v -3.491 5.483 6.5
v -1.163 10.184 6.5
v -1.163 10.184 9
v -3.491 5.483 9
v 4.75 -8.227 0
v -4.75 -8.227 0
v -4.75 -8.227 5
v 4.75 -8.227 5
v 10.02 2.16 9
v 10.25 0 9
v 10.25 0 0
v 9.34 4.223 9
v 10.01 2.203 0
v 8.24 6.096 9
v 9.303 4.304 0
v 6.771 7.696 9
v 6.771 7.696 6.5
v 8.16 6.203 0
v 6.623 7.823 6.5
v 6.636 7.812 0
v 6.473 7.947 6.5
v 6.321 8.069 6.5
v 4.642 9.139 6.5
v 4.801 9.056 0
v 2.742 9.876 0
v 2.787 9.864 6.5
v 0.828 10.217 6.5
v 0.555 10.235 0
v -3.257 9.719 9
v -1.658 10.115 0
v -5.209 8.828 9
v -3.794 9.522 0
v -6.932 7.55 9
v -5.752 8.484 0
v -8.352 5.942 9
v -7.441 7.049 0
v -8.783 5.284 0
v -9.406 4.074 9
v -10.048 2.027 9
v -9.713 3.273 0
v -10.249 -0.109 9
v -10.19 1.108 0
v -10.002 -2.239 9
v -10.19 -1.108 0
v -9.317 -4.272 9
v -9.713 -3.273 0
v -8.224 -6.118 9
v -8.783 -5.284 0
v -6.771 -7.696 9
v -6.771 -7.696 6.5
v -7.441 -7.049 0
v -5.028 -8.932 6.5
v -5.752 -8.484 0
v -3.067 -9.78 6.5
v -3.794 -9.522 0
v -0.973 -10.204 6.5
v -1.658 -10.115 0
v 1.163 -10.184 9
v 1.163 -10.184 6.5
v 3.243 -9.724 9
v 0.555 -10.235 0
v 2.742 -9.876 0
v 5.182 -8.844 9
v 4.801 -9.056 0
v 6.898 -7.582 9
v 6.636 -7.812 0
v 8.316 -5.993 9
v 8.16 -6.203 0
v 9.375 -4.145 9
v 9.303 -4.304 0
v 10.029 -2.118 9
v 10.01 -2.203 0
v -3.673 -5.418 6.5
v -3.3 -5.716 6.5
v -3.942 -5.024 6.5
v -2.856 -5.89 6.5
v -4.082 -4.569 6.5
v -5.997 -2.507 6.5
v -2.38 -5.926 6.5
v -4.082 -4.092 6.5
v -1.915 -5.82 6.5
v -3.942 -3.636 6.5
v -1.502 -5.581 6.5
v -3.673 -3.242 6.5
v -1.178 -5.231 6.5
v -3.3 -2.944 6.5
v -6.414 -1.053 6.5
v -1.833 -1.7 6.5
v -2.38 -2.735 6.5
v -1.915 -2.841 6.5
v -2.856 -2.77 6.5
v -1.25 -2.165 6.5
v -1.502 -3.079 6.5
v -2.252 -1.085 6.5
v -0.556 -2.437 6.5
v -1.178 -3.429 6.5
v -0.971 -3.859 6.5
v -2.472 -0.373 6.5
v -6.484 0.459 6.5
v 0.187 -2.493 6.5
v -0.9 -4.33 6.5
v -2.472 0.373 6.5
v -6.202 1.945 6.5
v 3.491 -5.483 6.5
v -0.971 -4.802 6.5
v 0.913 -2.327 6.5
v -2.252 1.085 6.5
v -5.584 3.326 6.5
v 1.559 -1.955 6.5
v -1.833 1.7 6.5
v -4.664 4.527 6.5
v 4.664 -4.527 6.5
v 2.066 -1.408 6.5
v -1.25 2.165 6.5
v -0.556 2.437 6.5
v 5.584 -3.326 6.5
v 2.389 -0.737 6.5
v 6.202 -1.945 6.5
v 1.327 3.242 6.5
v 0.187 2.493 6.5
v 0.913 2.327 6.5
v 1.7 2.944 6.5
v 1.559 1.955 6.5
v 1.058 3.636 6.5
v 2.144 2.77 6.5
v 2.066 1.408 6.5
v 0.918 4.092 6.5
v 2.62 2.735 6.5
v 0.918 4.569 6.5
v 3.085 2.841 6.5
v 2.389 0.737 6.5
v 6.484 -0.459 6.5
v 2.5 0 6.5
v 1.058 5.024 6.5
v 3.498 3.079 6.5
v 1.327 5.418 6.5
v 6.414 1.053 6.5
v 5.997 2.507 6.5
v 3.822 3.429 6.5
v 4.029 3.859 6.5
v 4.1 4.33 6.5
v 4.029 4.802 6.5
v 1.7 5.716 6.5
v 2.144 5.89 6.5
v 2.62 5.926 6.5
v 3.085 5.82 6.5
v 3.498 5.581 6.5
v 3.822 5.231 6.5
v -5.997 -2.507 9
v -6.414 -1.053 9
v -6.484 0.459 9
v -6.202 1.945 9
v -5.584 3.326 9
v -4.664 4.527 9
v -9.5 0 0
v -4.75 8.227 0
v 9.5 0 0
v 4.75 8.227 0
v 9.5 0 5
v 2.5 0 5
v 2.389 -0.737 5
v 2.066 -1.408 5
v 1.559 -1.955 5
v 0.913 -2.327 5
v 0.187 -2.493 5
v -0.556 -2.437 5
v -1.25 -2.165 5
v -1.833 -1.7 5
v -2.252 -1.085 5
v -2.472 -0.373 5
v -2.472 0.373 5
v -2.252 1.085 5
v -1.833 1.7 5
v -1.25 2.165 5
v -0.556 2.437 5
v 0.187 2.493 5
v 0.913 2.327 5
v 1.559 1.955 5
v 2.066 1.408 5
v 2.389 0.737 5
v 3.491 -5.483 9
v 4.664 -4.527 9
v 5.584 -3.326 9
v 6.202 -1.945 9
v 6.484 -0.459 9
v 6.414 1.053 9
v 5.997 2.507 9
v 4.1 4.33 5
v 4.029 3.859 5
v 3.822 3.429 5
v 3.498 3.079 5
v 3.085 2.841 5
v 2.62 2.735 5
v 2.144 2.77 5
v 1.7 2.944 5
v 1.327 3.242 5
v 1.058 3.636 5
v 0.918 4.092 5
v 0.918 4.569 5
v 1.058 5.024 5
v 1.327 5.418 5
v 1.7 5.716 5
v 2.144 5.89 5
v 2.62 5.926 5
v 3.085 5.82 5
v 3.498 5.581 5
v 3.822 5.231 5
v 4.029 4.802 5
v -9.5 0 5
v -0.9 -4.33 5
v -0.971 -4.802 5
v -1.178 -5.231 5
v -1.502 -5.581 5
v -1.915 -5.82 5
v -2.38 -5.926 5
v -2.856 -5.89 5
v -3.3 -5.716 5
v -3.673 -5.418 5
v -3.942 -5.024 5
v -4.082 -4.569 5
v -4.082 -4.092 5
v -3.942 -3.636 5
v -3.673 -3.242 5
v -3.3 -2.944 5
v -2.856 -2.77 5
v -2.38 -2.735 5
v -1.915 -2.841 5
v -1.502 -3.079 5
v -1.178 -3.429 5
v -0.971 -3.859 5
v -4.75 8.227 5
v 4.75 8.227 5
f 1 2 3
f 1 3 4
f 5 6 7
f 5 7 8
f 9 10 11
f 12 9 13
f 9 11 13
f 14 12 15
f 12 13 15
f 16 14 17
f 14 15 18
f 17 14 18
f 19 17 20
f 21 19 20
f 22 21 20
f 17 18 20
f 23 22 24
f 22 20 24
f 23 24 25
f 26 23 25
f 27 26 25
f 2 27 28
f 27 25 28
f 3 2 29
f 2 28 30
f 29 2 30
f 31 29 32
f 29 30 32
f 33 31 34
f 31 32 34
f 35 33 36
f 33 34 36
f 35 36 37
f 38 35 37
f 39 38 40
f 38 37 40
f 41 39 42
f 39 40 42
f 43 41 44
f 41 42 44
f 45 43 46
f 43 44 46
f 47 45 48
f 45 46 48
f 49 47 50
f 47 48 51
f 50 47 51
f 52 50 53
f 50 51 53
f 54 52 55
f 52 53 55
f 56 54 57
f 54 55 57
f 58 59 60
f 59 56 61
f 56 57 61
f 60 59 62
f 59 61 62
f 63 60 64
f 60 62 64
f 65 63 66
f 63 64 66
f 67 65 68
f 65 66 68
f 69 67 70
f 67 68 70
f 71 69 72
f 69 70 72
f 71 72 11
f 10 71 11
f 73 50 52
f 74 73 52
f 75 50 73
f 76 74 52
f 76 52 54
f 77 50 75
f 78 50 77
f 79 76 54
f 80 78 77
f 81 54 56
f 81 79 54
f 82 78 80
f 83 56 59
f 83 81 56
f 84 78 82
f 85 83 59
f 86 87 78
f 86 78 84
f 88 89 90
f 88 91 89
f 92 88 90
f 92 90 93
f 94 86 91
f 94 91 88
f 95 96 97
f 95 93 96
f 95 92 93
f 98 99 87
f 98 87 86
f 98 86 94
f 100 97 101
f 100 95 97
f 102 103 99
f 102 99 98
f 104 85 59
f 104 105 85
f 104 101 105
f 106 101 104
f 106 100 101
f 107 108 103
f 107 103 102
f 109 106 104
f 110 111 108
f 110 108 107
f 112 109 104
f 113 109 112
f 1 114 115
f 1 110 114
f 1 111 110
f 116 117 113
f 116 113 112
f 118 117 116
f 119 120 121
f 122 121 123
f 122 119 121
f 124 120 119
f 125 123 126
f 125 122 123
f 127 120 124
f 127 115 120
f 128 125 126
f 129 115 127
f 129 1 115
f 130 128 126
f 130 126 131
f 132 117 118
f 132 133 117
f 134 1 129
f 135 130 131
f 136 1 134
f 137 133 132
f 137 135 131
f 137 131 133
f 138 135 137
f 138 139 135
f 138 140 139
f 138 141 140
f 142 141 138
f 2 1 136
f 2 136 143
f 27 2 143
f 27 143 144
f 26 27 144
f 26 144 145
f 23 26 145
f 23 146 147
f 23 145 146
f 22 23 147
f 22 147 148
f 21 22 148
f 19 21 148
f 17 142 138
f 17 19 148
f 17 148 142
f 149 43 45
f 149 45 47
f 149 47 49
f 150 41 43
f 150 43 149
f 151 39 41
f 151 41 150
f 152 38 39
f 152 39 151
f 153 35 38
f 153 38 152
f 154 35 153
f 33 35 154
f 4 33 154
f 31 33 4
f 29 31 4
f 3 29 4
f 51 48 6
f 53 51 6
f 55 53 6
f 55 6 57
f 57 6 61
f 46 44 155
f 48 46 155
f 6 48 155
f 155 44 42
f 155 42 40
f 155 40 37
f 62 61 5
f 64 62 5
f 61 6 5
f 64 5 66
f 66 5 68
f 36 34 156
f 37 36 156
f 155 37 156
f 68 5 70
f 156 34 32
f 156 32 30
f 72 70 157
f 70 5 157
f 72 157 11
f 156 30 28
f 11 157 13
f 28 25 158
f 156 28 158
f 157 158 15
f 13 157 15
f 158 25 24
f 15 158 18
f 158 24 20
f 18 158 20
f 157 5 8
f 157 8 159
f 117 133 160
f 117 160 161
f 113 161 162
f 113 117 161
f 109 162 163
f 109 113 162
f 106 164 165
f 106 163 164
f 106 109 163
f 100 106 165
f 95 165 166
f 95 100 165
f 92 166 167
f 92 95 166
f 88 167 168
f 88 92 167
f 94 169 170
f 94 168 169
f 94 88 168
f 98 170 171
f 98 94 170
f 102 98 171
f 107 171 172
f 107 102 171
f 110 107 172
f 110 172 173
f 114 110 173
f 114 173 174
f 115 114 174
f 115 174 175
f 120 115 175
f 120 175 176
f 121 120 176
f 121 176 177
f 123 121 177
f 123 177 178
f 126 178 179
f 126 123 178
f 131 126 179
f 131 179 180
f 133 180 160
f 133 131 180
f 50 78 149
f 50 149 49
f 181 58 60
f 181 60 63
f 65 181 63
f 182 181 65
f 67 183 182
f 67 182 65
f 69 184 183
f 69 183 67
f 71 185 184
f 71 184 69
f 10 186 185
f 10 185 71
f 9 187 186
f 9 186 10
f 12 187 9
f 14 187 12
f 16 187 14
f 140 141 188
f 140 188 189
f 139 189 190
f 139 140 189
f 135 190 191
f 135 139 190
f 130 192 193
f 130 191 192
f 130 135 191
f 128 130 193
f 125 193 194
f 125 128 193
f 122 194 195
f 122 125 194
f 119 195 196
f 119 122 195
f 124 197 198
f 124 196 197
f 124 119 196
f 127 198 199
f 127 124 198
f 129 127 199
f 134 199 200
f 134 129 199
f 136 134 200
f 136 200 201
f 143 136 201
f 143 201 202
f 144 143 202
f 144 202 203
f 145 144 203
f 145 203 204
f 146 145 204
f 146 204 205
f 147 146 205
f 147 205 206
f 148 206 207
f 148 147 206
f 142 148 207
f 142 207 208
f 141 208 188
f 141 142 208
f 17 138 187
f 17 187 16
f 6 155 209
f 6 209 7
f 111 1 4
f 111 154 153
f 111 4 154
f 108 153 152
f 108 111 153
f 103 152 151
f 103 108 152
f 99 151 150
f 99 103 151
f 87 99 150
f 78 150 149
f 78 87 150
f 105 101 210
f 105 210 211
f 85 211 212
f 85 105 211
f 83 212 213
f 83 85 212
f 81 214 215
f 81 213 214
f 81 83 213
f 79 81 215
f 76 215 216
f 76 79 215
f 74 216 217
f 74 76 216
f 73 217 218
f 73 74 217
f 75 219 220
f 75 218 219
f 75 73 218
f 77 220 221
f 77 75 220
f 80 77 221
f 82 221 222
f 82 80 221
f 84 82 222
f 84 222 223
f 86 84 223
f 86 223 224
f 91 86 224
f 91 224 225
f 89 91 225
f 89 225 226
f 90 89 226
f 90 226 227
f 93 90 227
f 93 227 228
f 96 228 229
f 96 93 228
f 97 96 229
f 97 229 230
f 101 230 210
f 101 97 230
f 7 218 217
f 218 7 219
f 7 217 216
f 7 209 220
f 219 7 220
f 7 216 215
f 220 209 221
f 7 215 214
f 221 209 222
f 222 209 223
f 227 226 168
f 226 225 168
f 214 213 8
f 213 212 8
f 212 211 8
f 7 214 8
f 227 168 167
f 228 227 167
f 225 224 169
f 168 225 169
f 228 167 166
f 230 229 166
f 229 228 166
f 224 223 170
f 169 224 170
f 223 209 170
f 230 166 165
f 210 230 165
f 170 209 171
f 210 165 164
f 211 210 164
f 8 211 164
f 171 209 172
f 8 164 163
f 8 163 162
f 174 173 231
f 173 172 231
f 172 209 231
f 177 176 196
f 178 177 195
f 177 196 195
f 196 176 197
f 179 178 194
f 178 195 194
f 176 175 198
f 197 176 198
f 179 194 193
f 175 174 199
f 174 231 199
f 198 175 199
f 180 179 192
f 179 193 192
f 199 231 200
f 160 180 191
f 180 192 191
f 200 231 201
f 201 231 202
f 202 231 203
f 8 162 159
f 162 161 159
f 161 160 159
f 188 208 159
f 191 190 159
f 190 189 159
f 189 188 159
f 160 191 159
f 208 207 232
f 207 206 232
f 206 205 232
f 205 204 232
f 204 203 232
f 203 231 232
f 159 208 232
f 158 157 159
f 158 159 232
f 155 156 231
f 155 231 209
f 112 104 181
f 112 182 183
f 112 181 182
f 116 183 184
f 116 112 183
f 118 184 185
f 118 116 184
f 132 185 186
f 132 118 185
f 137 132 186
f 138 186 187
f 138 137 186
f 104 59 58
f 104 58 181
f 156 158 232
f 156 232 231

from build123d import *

# Parameters (mm, degrees)
SKETCH1_R               = 10.25
BOSS_EXTRUDE1_DEPTH     = 5
SKETCH2_R               = 10.25
BOSS_EXTRUDE2_DEPTH     = 4
CUT_EXTRUDE1_DEPTH      = 18.062385531
CUT_EXTRUDE1_DEPTH_BACK = 2.5
CUT_EXTRUDE2_DEPTH      = 16.333786225
CUT_EXTRUDE2_DEPTH_BACK = 16.333786225
SKETCH4_R               = 1.6
CUT_EXTRUDE3_DEPTH      = 16.333786225
CUT_EXTRUDE3_DEPTH_BACK = 16.333786225
SKETCH5_R               = 2.5


with BuildPart() as part:
    # Sketch1 → Boss-Extrude1 (new body)
    with BuildSketch(Plane.XY):
        Circle(SKETCH1_R)
        Polygon((4.75, 8.227241336), (-4.75, 8.227241336), (-9.5, 0), (-4.75, -8.227241336), (4.75, -8.227241336), (9.5, 0), align=None, mode=Mode.SUBTRACT)
    extrude(amount=BOSS_EXTRUDE1_DEPTH)

    # Sketch2 → Boss-Extrude2 (add)
    with BuildSketch(Plane.XY.offset(5)):
        Circle(SKETCH2_R)
    extrude(amount=BOSS_EXTRUDE2_DEPTH)

    # Sketch3 → Cut-Extrude1 (cut, two sides: drawn at the far end of the back side and taken through both)
    with BuildSketch(Plane.XY.offset(9).offset(-CUT_EXTRUDE1_DEPTH_BACK)):
        with BuildLine():
            ThreePointArc((-3.491027293, 5.482948882), (-6.202138006, 1.94511803), (-5.996942005, -2.507326583))
            Line((-5.996942005, -2.507326583), (-6.770608941, -7.695541213))
            ThreePointArc((-6.770608941, -7.695541213), (-3.067301509, -9.780294548), (1.163287858, -10.183774416))
            Line((1.163287858, -10.183774416), (3.491027293, -5.482948882))
            ThreePointArc((3.491027293, -5.482948882), (6.202138006, -1.94511803), (5.996942005, 2.507326583))
            Line((5.996942005, 2.507326583), (6.770608941, 7.695541213))
            ThreePointArc((6.770608941, 7.695541213), (6.548360484, 7.885523126), (6.32078374, 8.069088728))
            ThreePointArc((6.32078374, 8.069088728), (2.787097923, 9.86380176), (-1.163287858, 10.183774416))
            Line((-1.163287858, 10.183774416), (-3.491027293, 5.482948882))
        make_face()
    extrude(amount=CUT_EXTRUDE1_DEPTH + CUT_EXTRUDE1_DEPTH_BACK, mode=Mode.SUBTRACT)

    # Sketch4 → Cut-Extrude2 (cut, two sides: drawn at the far end of the back side and taken through both)
    with BuildSketch(Plane(origin=(0, 0, 5), x_dir=(-1, 0, 0), z_dir=(0, 0, -1)).offset(-CUT_EXTRUDE2_DEPTH_BACK)):
        with Locations(Location((2.5, -4.330127019, 0), (0, 0, 180))):
            Circle(SKETCH4_R)
        with Locations(Location((-2.5, 4.330127019, 0), (0, 0, 180))):
            Circle(SKETCH4_R)
    extrude(amount=CUT_EXTRUDE2_DEPTH + CUT_EXTRUDE2_DEPTH_BACK, mode=Mode.SUBTRACT)

    # Sketch5 → Cut-Extrude3 (cut, two sides: drawn at the far end of the back side and taken through both)
    with BuildSketch(Plane(origin=(0, 0, 5), x_dir=(-1, 0, 0), z_dir=(0, 0, -1)).offset(-CUT_EXTRUDE3_DEPTH_BACK)):
        with Locations(Location((0, 0, 0), (0, 0, 180))):
            Circle(SKETCH5_R)
    extrude(amount=CUT_EXTRUDE3_DEPTH + CUT_EXTRUDE3_DEPTH_BACK, mode=Mode.SUBTRACT)


solid = part.part
